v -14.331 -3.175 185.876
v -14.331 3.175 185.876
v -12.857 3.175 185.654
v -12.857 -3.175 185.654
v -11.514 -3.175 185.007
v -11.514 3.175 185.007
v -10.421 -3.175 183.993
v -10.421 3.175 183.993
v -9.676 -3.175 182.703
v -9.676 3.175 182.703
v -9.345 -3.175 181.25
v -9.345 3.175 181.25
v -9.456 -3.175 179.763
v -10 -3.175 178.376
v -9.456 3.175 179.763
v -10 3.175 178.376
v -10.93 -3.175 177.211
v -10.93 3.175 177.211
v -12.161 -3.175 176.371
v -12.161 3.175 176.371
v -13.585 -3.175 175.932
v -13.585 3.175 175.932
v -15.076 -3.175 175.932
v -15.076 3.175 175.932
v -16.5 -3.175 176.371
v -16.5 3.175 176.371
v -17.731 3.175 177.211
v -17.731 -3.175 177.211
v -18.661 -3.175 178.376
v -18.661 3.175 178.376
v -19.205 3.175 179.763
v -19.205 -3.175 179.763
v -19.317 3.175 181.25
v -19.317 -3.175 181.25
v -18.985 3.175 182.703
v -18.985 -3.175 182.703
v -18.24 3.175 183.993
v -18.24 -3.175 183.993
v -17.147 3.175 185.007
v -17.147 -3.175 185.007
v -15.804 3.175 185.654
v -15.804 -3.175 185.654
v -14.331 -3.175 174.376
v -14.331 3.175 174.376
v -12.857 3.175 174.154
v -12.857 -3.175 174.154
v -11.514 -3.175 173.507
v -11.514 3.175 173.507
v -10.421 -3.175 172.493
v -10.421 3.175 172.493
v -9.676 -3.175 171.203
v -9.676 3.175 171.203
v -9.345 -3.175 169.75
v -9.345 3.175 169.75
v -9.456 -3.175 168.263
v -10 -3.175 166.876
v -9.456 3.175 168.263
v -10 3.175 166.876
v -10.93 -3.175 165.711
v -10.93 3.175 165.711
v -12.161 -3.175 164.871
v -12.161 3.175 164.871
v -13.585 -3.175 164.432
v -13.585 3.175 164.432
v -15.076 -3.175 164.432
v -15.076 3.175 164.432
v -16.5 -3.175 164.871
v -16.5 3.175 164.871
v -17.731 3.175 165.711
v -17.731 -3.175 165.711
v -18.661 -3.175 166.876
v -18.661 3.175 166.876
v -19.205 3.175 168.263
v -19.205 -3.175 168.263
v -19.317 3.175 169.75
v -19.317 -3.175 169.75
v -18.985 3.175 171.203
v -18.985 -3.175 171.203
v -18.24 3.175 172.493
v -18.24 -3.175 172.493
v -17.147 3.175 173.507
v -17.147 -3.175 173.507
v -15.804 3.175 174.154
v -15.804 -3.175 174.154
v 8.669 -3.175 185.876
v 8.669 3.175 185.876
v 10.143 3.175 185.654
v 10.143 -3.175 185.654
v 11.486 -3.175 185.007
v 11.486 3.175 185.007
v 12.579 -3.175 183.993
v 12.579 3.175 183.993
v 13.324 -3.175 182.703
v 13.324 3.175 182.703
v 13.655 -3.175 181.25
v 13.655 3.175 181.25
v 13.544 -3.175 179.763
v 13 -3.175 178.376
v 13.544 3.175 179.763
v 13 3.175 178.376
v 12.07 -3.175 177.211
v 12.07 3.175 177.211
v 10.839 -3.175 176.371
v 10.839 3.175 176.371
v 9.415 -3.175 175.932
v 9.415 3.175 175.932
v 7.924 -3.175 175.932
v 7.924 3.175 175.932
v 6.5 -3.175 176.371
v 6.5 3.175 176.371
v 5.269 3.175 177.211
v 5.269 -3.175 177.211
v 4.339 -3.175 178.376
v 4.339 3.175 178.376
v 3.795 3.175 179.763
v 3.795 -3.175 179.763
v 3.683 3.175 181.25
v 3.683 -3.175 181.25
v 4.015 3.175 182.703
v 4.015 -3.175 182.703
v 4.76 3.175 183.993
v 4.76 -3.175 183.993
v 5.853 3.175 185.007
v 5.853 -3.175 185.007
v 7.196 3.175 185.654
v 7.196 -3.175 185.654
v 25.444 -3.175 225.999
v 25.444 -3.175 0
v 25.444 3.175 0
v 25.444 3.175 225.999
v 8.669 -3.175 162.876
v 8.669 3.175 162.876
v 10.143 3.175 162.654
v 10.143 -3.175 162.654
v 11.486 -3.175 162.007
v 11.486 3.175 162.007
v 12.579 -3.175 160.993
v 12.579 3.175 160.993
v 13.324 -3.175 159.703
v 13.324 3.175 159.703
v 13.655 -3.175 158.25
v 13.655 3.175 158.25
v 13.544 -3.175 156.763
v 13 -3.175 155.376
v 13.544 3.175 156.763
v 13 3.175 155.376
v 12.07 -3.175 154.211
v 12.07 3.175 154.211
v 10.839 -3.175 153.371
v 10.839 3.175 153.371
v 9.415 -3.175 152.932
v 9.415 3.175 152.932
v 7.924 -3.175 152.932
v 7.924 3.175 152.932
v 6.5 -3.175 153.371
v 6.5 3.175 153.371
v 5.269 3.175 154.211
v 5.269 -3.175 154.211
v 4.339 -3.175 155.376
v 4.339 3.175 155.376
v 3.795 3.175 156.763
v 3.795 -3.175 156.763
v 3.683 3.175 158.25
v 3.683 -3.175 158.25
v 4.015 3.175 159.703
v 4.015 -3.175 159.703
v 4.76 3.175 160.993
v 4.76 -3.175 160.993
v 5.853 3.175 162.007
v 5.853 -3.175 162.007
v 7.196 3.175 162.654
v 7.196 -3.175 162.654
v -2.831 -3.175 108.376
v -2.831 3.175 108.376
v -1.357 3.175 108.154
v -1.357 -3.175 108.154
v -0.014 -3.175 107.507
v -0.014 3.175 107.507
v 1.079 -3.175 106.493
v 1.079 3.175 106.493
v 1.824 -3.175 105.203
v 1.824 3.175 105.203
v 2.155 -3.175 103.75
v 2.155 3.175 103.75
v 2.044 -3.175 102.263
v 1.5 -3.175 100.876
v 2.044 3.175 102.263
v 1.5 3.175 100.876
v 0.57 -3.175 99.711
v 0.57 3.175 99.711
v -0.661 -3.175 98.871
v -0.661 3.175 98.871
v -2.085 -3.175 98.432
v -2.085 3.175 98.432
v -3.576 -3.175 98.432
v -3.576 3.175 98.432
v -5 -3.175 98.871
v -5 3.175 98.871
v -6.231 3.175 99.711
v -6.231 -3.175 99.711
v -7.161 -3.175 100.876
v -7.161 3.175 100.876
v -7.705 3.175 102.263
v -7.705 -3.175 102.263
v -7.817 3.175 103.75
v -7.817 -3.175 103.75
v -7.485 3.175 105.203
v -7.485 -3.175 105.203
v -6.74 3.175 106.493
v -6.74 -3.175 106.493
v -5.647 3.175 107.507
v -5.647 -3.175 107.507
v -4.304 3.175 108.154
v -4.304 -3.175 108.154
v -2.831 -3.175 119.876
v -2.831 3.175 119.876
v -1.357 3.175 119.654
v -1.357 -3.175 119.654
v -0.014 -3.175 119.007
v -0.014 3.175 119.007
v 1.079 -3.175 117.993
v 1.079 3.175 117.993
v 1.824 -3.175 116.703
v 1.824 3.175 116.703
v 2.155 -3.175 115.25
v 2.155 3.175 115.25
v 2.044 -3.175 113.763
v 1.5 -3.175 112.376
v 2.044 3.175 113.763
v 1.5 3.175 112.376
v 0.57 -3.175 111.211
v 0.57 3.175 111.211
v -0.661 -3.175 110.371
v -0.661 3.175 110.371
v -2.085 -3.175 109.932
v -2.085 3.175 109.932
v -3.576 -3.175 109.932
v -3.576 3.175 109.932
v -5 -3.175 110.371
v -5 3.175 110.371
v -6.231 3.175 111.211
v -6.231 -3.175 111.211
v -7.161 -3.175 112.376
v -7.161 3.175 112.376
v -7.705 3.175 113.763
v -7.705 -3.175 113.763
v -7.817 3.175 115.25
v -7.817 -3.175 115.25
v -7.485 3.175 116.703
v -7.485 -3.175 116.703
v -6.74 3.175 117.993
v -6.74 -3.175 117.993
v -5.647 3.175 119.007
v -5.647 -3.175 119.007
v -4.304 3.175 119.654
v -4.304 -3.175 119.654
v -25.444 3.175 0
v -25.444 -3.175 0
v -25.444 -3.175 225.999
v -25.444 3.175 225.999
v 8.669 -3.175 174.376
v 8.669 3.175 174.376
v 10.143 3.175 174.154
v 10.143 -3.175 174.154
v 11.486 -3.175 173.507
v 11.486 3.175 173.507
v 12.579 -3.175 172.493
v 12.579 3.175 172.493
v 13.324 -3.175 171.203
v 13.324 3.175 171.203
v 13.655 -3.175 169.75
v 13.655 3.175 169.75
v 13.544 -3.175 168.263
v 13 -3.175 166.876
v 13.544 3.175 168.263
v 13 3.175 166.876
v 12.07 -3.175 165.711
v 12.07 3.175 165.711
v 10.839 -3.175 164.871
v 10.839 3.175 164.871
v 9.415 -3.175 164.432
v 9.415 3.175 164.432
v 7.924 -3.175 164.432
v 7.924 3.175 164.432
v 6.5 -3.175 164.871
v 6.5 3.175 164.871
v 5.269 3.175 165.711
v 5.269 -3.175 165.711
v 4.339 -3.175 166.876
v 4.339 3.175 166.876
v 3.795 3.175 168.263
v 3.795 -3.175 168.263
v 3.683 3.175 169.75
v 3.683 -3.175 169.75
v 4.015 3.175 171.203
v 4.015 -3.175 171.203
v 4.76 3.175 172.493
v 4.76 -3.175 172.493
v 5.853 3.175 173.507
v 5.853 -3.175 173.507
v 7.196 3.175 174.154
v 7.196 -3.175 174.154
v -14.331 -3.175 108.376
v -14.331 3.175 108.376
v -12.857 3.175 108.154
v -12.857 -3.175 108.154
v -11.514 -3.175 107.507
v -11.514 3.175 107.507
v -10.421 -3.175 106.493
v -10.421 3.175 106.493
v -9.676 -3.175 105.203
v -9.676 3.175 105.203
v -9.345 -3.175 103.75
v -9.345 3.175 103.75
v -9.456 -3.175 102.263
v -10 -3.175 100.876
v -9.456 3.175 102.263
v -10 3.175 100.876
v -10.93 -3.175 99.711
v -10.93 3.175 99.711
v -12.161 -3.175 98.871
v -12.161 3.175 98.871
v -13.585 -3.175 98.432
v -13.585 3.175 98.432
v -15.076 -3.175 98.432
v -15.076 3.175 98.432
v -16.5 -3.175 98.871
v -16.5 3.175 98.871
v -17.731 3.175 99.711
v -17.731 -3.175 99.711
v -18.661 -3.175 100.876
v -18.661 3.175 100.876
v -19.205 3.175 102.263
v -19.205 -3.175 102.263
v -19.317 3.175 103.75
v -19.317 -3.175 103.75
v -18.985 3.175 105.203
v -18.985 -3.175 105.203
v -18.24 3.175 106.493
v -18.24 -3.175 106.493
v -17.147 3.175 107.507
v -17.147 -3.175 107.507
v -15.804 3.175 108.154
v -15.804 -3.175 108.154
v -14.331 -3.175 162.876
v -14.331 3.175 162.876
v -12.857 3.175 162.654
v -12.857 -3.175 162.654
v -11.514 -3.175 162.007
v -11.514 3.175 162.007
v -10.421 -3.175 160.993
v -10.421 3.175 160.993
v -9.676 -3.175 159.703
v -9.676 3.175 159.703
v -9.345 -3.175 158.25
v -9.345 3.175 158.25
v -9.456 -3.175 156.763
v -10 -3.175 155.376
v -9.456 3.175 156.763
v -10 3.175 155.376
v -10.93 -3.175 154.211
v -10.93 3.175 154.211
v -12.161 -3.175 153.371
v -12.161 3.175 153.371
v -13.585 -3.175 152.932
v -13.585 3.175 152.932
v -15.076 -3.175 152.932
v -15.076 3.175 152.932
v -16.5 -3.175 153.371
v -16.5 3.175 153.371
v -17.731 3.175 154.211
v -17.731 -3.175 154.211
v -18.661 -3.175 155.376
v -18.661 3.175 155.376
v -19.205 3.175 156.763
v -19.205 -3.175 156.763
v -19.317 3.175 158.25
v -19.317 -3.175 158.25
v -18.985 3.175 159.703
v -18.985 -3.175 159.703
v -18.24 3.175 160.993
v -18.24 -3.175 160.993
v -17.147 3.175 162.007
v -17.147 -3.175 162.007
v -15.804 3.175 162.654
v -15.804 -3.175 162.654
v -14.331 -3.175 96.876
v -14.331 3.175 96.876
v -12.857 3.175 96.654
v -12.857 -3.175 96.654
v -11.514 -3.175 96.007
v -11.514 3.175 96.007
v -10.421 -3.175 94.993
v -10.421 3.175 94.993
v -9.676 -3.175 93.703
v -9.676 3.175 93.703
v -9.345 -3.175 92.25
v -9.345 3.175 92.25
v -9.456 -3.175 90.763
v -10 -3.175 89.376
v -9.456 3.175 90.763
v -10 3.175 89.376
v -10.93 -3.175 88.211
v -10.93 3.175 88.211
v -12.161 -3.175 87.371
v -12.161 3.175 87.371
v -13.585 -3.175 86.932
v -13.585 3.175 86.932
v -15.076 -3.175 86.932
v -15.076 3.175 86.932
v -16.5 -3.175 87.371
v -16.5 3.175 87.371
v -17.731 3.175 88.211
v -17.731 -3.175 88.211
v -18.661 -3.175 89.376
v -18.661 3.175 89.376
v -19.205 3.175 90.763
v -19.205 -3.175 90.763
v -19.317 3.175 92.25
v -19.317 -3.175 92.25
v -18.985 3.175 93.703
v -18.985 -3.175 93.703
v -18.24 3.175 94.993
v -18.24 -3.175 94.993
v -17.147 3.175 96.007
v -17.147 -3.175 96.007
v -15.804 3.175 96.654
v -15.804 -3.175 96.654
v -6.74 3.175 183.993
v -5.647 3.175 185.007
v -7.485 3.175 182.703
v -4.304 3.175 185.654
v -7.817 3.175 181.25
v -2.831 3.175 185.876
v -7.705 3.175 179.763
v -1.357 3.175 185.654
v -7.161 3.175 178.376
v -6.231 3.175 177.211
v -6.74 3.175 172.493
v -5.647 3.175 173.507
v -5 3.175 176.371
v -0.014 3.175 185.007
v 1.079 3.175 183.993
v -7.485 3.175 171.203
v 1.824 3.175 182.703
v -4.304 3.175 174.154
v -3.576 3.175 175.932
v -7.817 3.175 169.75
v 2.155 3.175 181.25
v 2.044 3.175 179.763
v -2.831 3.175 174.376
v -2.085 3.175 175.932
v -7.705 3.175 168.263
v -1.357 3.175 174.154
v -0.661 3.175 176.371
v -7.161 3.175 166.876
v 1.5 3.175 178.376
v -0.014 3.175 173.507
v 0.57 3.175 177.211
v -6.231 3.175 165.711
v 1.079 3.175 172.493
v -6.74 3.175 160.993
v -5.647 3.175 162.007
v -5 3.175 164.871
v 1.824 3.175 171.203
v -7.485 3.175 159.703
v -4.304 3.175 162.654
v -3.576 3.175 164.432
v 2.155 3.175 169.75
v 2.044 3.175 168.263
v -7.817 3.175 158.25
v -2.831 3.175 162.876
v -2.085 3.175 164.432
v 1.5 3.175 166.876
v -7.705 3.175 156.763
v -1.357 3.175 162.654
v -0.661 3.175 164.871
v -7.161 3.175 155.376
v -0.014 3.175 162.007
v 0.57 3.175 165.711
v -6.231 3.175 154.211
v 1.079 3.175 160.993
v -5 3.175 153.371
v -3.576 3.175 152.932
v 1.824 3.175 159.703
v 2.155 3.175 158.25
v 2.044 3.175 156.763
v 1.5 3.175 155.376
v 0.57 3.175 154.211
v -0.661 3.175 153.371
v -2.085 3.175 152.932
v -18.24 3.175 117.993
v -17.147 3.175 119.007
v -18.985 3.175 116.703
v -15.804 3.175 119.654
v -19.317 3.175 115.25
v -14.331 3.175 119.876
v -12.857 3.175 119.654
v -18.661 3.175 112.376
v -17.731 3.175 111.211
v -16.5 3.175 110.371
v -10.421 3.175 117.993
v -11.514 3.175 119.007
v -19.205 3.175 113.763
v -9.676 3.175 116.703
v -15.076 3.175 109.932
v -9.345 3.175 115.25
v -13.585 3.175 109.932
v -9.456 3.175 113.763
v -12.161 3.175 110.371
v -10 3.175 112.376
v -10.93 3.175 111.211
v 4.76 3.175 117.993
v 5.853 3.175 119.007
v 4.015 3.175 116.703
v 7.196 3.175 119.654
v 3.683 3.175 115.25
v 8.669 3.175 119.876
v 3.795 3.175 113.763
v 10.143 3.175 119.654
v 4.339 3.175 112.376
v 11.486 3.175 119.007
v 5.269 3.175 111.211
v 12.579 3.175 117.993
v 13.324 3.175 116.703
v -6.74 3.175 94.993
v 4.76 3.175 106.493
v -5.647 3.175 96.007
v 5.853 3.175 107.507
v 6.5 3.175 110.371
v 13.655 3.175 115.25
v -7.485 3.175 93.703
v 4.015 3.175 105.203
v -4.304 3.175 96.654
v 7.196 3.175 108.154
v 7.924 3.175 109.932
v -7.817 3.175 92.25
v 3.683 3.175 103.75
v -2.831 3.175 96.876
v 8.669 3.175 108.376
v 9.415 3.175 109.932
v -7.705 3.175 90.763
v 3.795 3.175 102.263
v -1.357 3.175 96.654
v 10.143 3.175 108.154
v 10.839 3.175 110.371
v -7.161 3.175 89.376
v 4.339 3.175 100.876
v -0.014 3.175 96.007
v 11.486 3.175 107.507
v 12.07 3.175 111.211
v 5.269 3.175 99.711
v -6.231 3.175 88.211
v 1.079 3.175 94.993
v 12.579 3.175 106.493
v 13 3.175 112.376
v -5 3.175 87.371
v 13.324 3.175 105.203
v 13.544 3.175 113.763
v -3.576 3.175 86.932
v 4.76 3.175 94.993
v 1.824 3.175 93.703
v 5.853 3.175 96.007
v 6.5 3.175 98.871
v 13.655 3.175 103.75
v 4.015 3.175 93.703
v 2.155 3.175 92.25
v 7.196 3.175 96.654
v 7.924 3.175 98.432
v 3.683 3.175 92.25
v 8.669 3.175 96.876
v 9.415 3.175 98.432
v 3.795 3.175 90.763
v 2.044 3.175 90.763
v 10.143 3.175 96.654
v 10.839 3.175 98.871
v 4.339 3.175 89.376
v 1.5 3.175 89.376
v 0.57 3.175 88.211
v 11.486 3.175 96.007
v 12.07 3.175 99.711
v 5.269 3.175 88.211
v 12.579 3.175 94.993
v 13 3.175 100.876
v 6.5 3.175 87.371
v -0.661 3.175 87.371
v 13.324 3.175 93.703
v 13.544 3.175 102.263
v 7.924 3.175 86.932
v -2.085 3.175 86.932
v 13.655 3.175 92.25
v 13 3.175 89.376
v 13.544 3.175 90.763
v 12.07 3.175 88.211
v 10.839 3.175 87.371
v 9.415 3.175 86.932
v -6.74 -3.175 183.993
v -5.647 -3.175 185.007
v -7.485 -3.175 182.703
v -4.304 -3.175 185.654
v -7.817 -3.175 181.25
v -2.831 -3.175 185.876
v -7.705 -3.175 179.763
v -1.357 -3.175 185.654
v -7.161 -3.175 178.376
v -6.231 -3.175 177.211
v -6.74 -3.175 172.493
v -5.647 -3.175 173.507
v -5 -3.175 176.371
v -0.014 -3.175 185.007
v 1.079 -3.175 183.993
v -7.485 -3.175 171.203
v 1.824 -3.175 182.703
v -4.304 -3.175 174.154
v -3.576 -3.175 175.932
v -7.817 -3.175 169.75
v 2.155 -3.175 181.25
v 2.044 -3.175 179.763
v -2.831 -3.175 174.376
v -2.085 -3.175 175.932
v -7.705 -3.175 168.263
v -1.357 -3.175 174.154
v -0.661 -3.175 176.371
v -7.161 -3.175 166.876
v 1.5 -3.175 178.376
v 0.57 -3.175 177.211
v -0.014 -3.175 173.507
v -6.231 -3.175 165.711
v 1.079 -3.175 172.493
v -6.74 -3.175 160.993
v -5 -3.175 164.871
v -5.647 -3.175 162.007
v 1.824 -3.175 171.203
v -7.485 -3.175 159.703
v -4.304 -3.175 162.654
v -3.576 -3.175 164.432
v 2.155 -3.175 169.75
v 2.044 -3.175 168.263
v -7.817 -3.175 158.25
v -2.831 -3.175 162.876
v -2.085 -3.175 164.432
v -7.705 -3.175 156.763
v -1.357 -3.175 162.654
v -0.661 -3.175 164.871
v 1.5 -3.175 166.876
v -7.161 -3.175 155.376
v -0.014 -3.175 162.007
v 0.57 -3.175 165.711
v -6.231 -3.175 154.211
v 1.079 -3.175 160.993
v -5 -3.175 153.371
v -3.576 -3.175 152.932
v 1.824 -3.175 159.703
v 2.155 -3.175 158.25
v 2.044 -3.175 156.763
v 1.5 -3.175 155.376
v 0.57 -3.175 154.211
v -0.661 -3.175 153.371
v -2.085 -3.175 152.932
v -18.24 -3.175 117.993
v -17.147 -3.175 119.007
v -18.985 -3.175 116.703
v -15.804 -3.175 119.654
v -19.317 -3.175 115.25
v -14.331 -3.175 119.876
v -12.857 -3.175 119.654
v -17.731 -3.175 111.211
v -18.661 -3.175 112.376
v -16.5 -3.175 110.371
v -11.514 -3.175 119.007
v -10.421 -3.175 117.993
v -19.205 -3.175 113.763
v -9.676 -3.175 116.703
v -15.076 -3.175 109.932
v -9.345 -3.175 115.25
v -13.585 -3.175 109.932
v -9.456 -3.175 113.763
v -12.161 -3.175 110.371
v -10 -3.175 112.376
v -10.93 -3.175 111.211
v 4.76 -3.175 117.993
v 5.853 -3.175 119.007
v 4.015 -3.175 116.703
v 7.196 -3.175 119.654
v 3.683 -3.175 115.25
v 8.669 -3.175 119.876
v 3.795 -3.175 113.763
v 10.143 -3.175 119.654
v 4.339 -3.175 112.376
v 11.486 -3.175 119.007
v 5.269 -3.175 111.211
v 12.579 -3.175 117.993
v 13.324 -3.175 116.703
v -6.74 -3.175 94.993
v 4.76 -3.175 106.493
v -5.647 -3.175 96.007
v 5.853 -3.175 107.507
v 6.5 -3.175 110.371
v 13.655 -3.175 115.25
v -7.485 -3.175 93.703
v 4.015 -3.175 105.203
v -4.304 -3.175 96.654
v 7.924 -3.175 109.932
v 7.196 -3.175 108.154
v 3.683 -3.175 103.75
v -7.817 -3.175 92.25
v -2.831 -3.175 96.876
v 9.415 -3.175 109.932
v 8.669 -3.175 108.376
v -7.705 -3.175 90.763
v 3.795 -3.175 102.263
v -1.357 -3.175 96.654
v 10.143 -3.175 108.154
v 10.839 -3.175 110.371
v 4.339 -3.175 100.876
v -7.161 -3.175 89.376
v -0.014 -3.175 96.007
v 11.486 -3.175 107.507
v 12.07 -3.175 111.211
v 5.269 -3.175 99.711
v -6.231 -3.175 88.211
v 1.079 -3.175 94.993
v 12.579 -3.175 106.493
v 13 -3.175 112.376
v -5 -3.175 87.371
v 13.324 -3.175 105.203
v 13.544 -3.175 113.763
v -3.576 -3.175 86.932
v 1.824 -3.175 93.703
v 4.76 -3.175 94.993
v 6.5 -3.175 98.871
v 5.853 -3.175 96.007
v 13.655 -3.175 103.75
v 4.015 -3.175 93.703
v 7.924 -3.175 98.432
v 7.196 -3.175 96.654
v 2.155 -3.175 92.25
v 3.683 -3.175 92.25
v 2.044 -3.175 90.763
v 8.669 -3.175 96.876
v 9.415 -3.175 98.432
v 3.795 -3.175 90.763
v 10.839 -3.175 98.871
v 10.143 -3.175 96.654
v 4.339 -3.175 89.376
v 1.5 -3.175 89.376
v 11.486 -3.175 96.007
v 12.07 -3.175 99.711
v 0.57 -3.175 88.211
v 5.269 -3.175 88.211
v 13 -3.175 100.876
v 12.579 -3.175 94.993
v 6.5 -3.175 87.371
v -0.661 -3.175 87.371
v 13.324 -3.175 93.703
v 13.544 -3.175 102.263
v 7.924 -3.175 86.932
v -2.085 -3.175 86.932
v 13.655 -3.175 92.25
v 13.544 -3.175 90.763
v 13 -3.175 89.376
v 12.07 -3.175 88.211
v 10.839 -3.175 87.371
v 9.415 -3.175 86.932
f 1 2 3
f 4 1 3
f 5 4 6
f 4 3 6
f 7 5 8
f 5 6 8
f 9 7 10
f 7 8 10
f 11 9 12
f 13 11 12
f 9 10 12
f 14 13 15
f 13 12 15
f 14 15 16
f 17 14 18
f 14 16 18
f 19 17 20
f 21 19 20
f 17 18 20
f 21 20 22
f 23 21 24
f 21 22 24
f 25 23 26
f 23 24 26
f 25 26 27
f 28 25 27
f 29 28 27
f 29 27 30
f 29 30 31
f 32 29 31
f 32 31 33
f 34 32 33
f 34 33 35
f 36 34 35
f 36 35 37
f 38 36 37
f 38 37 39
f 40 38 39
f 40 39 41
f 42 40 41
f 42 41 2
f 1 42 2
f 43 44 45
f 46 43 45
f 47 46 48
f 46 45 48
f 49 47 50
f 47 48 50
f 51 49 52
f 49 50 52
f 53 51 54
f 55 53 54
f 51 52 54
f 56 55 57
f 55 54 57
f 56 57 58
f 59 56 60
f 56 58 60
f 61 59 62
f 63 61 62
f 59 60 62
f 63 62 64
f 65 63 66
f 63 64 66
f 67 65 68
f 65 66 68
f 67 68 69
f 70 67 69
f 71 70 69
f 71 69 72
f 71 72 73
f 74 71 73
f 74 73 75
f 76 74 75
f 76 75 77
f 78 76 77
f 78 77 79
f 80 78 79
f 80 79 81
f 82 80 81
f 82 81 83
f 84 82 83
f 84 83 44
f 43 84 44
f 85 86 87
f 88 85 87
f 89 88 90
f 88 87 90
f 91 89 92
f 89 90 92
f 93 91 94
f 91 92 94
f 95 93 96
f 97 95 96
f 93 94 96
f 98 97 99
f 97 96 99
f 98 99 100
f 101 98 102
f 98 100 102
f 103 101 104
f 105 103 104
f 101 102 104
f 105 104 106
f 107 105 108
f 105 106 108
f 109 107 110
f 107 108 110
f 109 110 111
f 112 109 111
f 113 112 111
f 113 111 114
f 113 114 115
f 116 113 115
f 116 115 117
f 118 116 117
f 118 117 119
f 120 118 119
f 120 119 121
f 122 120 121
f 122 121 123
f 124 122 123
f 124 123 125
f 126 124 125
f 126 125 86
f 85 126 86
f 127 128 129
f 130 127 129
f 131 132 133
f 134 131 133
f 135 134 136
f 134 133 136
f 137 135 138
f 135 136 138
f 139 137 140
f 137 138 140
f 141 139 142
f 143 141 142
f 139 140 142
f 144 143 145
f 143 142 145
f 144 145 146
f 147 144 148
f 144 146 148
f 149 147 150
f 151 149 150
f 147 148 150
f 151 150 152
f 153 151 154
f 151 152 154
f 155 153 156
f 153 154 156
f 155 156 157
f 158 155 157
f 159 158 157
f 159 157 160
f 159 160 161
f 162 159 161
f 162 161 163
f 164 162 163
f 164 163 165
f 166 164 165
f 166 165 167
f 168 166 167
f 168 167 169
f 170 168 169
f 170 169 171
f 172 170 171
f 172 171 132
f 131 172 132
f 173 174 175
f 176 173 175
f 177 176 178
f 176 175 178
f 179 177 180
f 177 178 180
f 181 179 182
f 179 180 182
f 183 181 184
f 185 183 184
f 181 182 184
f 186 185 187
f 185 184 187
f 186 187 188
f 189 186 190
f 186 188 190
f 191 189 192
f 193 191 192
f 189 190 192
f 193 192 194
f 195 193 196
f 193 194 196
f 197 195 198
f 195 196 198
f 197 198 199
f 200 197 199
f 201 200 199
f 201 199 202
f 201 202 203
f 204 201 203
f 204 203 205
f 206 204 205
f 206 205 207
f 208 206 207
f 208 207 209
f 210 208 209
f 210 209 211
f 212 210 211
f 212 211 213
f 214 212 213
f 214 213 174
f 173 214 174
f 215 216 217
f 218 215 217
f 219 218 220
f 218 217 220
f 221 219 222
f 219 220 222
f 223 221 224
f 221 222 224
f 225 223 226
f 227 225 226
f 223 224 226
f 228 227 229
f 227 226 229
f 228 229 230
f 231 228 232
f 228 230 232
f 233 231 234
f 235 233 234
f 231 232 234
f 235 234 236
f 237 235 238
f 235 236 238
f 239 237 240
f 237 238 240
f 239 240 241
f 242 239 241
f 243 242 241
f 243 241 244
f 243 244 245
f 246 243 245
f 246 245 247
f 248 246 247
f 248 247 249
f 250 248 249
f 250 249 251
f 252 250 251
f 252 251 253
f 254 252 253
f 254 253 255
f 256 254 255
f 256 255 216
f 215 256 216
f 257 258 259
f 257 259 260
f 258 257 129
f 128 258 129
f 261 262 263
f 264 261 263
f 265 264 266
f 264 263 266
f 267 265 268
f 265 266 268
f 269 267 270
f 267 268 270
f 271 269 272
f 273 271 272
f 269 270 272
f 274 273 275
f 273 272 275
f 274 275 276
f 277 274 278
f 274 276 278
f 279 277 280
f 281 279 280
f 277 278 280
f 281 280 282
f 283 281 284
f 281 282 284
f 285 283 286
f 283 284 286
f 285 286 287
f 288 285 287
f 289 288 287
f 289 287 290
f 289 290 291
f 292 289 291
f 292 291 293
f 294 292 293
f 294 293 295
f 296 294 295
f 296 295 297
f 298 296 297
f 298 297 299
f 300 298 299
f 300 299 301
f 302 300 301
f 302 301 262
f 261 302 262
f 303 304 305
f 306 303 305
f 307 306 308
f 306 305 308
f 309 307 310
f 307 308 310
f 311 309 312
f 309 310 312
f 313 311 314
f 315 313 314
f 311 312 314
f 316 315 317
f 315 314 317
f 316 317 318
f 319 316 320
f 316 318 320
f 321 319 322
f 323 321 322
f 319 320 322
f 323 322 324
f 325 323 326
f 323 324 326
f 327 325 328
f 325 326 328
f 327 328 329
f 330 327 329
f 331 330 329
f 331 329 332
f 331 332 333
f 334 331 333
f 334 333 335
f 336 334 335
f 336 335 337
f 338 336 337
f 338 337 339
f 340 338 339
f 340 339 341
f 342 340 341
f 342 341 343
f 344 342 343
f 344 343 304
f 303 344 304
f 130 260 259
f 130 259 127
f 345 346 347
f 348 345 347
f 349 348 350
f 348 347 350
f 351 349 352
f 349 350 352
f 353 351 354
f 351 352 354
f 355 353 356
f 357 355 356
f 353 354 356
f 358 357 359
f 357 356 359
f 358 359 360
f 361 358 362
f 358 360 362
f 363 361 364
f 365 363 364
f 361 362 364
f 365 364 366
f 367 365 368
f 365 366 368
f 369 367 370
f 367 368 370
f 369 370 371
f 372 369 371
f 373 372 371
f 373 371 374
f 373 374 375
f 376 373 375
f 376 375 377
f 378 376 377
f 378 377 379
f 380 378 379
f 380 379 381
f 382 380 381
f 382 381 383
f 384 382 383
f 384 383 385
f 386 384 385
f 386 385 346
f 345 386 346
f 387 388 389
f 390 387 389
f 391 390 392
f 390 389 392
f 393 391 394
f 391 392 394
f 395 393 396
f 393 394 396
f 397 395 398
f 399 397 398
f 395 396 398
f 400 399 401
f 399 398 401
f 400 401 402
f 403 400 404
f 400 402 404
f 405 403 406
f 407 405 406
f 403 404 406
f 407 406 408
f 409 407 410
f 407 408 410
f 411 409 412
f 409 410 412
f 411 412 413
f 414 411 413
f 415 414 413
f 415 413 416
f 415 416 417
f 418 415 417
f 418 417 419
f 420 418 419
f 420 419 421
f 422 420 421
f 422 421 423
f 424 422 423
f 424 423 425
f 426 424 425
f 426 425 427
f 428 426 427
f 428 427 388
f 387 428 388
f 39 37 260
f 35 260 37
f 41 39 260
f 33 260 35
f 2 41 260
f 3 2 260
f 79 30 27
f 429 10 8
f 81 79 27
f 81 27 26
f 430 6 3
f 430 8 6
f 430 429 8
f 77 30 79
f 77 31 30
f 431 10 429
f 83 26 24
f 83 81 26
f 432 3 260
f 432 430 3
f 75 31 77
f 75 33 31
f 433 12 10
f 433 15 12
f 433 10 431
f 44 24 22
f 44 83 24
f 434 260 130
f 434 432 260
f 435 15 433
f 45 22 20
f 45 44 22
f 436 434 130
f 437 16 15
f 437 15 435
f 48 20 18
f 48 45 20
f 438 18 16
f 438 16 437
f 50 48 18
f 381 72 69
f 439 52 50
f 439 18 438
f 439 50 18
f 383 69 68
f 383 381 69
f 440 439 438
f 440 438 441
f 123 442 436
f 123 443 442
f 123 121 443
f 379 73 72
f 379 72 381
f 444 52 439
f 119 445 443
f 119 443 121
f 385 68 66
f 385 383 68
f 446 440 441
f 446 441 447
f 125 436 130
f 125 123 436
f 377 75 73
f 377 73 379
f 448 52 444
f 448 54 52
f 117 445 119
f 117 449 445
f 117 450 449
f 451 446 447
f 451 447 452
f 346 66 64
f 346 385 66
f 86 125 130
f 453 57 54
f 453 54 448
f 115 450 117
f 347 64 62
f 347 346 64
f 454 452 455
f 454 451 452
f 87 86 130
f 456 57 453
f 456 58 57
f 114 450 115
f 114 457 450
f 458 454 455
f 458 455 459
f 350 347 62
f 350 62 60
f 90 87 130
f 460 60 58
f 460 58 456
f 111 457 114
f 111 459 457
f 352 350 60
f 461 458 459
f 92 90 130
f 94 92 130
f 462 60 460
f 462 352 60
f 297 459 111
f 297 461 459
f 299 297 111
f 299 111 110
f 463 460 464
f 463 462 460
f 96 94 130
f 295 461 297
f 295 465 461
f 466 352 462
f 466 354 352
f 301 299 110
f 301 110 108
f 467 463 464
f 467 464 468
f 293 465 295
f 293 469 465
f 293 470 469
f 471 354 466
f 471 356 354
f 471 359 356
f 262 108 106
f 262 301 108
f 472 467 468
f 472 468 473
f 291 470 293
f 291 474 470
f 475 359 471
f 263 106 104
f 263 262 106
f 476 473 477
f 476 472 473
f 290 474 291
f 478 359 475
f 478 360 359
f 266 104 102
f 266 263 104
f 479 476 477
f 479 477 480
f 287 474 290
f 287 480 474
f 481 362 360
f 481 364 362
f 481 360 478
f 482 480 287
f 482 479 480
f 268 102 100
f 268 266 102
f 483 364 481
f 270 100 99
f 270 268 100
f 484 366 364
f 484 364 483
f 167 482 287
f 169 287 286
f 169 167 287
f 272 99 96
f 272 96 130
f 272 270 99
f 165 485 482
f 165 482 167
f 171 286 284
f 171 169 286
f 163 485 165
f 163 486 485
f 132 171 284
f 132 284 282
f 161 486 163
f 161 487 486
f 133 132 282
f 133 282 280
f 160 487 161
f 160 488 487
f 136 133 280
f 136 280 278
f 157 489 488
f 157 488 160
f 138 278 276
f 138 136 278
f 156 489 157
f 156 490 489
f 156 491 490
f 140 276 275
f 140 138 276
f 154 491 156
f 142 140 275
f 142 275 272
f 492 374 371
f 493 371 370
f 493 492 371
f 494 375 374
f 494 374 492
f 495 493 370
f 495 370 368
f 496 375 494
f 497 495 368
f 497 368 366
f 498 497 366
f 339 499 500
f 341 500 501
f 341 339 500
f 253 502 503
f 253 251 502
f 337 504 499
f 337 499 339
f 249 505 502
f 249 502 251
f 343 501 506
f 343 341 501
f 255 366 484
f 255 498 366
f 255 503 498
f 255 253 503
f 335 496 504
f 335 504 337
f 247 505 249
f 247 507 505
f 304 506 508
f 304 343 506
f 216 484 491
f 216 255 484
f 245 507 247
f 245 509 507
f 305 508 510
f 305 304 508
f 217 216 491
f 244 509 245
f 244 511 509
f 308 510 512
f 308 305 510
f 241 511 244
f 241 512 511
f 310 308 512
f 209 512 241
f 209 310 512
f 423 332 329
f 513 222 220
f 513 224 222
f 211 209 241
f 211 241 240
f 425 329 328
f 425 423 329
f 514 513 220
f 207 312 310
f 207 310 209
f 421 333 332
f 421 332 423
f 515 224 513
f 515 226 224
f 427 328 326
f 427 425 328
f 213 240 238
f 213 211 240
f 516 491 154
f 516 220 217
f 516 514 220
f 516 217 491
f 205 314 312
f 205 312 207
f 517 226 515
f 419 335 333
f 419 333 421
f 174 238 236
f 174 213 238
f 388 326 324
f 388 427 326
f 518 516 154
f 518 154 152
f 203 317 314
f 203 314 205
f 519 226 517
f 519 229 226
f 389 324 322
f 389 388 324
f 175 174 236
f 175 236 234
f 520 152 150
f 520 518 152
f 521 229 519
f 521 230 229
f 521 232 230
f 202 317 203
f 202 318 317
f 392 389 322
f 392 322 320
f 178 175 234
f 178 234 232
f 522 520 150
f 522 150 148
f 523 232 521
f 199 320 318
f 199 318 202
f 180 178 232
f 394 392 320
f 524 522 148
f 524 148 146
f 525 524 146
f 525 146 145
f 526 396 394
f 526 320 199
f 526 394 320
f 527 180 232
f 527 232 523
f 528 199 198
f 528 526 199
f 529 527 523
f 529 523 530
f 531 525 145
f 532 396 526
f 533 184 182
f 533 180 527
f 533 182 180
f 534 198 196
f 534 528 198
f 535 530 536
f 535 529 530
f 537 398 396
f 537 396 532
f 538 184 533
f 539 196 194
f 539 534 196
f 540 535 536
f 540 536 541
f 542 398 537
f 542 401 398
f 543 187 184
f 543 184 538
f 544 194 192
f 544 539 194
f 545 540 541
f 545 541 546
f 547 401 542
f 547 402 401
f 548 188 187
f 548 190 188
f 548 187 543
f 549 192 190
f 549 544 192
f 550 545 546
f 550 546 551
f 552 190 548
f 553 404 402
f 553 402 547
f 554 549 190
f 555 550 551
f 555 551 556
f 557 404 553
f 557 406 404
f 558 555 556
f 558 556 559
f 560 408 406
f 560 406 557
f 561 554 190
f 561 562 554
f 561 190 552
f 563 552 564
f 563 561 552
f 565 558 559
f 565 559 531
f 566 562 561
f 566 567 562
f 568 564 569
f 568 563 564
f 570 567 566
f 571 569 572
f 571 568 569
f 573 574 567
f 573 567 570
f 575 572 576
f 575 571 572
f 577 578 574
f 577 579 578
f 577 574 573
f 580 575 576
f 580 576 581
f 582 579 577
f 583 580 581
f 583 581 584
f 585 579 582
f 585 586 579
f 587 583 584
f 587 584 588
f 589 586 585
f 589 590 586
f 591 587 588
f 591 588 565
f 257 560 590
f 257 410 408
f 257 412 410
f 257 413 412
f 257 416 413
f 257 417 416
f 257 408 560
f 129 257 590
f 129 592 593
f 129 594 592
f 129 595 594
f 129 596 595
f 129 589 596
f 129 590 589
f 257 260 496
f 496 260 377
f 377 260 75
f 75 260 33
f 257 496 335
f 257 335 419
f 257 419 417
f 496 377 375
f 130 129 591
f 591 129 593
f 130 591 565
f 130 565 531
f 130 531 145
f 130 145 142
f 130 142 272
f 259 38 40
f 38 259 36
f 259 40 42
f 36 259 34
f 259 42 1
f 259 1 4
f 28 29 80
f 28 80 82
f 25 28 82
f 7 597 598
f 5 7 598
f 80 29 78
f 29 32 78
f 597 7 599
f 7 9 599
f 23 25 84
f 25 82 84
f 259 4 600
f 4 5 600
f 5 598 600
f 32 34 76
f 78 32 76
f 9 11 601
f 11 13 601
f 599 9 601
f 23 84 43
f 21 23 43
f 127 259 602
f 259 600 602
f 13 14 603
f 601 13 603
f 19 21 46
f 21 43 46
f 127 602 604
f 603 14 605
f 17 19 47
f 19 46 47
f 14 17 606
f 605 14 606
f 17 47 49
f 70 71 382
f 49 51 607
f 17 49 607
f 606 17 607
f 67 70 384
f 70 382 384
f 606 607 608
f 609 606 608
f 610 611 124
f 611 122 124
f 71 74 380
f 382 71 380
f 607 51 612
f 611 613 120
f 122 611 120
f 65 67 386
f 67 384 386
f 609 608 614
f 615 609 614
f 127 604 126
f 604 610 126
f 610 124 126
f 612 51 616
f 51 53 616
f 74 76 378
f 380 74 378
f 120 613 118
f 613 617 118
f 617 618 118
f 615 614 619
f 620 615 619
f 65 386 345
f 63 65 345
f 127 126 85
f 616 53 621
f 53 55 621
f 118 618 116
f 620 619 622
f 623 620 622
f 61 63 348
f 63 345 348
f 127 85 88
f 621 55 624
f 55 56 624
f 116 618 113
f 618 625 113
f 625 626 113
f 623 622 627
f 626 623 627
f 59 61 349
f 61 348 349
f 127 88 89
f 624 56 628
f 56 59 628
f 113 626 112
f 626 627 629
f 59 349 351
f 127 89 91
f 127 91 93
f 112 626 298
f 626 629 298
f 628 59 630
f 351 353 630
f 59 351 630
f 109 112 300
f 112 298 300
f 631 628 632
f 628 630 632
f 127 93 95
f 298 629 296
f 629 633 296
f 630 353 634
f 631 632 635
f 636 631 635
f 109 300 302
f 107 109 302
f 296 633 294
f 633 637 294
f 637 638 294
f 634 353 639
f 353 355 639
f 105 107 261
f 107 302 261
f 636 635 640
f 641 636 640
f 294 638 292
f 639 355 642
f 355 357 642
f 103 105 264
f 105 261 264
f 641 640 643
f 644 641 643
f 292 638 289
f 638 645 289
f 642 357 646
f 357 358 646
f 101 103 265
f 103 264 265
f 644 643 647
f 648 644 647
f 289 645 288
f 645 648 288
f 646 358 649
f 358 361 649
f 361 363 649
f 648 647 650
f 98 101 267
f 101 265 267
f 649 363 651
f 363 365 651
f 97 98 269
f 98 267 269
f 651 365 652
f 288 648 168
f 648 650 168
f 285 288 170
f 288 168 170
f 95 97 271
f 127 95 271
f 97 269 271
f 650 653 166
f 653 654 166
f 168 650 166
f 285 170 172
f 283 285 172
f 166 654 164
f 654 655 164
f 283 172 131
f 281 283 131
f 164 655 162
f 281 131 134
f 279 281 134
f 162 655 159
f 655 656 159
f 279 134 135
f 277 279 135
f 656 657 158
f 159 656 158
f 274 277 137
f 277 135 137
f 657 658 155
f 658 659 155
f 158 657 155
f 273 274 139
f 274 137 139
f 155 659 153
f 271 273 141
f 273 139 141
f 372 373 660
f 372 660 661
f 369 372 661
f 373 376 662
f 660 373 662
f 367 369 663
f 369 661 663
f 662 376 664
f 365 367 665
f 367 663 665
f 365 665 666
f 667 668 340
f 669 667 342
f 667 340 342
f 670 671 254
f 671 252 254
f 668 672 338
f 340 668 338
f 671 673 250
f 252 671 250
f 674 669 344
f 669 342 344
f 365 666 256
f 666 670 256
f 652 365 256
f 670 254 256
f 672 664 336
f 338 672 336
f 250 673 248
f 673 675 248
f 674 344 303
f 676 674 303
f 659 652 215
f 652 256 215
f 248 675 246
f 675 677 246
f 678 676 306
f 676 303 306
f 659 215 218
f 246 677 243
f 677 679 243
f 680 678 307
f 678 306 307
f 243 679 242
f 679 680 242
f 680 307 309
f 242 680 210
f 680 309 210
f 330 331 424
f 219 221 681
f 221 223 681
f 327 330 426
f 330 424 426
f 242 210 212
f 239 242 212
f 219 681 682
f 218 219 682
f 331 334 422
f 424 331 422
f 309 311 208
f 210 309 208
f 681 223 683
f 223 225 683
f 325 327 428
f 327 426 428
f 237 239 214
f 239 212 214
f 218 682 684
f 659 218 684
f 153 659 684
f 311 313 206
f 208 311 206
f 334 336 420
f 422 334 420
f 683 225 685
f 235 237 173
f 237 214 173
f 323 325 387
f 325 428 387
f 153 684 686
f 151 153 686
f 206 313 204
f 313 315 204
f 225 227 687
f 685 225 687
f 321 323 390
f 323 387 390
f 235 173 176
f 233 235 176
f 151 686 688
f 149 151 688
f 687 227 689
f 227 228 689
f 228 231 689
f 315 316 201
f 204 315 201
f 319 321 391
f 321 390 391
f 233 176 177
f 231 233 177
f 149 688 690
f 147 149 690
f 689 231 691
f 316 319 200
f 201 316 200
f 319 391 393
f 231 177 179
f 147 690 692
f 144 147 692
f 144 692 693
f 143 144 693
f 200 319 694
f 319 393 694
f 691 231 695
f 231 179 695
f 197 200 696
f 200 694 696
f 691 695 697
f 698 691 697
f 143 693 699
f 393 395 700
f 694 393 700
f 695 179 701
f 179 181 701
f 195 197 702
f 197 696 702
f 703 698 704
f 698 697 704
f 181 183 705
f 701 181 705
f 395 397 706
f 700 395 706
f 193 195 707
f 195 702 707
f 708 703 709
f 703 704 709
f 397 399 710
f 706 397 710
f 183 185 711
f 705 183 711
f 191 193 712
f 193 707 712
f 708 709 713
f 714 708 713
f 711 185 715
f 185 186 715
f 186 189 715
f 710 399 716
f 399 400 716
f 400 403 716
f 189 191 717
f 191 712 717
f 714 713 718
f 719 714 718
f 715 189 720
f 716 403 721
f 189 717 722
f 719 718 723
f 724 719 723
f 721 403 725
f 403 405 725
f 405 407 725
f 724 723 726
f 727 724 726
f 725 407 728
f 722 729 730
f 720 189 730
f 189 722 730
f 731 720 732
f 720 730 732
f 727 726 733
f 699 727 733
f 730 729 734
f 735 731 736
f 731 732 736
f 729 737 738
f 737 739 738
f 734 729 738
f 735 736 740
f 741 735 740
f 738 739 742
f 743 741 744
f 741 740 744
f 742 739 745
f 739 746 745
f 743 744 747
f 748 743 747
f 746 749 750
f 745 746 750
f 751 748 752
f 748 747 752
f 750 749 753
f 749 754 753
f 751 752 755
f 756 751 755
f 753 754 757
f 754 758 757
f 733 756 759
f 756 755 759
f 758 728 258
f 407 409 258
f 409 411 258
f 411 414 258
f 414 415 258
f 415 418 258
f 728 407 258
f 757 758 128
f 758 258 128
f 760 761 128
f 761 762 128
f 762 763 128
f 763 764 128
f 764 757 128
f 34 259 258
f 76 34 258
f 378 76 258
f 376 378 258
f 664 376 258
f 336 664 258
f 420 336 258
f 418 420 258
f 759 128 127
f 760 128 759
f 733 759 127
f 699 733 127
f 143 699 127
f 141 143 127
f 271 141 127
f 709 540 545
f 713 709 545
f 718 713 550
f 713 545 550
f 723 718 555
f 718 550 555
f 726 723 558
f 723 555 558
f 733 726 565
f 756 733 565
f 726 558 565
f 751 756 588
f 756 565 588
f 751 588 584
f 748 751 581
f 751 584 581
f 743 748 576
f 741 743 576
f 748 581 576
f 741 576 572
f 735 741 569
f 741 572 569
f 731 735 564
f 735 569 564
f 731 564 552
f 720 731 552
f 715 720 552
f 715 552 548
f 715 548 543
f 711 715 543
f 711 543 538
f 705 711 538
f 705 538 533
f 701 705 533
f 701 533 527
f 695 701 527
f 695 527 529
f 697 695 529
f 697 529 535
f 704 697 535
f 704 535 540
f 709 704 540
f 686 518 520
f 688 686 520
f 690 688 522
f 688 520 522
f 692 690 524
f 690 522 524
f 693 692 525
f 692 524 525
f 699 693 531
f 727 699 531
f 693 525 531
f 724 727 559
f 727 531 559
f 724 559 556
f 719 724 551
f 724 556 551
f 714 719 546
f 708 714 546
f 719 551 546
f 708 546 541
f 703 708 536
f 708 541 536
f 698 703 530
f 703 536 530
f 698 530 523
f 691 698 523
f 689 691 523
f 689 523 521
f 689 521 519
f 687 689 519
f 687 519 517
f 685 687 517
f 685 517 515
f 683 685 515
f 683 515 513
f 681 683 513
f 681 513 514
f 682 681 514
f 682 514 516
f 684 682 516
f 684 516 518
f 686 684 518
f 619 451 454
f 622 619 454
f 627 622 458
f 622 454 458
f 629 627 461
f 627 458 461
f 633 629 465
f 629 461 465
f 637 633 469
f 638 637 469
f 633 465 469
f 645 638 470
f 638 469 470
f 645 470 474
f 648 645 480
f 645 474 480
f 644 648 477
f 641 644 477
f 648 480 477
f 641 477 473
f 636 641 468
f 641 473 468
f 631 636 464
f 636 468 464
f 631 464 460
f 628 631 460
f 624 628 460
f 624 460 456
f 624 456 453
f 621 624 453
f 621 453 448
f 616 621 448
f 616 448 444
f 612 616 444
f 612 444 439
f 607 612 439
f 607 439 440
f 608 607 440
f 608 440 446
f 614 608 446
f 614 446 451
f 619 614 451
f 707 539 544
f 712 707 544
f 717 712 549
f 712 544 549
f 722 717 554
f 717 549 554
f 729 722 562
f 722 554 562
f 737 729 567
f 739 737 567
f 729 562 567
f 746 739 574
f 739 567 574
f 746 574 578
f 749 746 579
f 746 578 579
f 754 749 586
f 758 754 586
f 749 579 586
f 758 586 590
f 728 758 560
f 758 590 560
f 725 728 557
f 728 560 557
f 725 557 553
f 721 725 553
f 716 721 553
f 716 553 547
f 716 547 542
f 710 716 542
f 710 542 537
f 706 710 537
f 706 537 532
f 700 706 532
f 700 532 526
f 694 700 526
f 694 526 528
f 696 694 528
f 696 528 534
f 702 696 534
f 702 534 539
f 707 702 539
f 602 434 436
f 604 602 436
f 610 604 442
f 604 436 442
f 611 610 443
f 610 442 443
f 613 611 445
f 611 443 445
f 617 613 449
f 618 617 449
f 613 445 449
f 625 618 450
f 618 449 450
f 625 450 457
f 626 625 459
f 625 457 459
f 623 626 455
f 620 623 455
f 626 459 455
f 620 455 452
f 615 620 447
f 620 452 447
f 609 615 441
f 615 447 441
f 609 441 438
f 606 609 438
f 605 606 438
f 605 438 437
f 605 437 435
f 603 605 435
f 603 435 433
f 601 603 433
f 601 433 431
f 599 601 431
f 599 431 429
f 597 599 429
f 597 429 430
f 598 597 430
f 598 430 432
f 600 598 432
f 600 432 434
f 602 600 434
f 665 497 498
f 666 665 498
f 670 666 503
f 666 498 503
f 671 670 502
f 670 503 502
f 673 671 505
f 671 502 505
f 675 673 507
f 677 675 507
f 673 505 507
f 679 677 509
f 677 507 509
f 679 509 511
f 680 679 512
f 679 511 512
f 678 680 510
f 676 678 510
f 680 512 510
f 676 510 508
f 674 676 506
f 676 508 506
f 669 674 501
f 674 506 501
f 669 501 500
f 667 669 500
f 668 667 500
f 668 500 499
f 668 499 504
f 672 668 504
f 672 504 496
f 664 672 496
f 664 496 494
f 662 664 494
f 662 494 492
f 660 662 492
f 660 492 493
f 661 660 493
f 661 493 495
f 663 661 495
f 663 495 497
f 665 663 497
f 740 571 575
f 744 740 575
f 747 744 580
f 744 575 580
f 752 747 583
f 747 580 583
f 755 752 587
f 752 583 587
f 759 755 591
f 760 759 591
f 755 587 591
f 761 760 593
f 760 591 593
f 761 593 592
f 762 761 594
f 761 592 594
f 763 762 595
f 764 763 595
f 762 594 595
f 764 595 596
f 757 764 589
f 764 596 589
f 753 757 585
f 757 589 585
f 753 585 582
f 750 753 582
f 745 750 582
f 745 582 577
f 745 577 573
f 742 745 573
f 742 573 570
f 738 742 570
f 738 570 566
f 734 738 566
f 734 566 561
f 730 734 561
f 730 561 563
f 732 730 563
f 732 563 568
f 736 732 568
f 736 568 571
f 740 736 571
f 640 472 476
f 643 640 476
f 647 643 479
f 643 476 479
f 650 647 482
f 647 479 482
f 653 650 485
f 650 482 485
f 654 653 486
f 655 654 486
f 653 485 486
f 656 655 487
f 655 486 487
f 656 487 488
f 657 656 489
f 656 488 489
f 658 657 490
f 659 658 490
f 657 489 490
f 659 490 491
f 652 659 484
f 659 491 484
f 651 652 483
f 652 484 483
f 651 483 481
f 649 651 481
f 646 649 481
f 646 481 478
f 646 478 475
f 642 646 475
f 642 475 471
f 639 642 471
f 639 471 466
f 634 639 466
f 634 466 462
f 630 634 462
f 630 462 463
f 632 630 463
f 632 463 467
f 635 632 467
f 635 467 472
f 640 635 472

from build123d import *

# Parameters (mm, degrees)
SKETCH1_W                 = 50.8889
SKETCH1_H                 = 6.35
BOSS_EXTRUDE1_DEPTH       = 225.99904
SKETCH3_R                 = 5.000000033
CUT_EXTRUDE1_DEPTH        = 228.515512914
LPATTERN1_COUNT           = 3
LPATTERN1_PITCH           = 11.500000114
LPATTERN1_COUNT_DIR2      = 3
LPATTERN1_PITCH_DIR2      = 11.500000114
LPATTERN2_COUNT           = 2
LPATTERN2_PITCH           = 66.00000008
LPATTERN2_COPY_1_SKETCH_R = 5.000000033
LPATTERN2_COPY_1_DEPTH    = 228.515512914
LPATTERN2_COPY_2_SKETCH_R = 5.000000033
LPATTERN2_COPY_2_DEPTH    = 228.515512914
LPATTERN2_COPY_3_SKETCH_R = 5.000000033
LPATTERN2_COPY_3_DEPTH    = 228.515512914
LPATTERN2_COPY_4_SKETCH_R = 5.000000033
LPATTERN2_COPY_4_DEPTH    = 228.515512914
LPATTERN2_COPY_5_SKETCH_R = 5.000000033
LPATTERN2_COPY_5_DEPTH    = 228.515512914
LPATTERN2_COPY_6_SKETCH_R = 5.000000033
LPATTERN2_COPY_6_DEPTH    = 228.515512914
LPATTERN2_COPY_7_SKETCH_R = 5.000000033
LPATTERN2_COPY_7_DEPTH    = 228.515512914
LPATTERN2_COPY_8_SKETCH_R = 5.000000033
LPATTERN2_COPY_8_DEPTH    = 228.515512914


with BuildPart() as part:
    # Sketch1 → Boss-Extrude1 (new body)
    with BuildSketch(Plane.XY):
        Rectangle(SKETCH1_W, SKETCH1_H)
    extrude(amount=BOSS_EXTRUDE1_DEPTH)

    # Sketch3 → Cut-Extrude1 (cut, through all)
    with BuildSketch(Plane(origin=(0, 3.175, 0), x_dir=(1, 0, 0), z_dir=(0, 1, 0))):
        with Locations(Location((8.669450022, -180.875882939, 0), (0, 0, 270))):
            Circle(SKETCH3_R)
    cut_extrude1 = extrude(amount=-CUT_EXTRUDE1_DEPTH, mode=Mode.SUBTRACT)

    # LPattern1: Cut-Extrude1 3 × 3
    with Locations(*[(-i * LPATTERN1_PITCH, 0, -j * LPATTERN1_PITCH_DIR2) for i in range(LPATTERN1_COUNT) for j in range(LPATTERN1_COUNT_DIR2) if (i, j) != (0, 0)]):
        add(cut_extrude1, mode=Mode.SUBTRACT)

    # LPattern2: Cut-Extrude1 ×2
    with Locations(*[(0, 0, -i * LPATTERN2_PITCH) for i in range(1, LPATTERN2_COUNT)]):
        add(cut_extrude1, mode=Mode.SUBTRACT)

    # LPattern2 copy 1 sketch → LPattern2 copy 1 (cut, through all)
    with BuildSketch(Plane(origin=(0, 3.175, -77.500000194), x_dir=(1, 0, 0), z_dir=(0, 1, 0))):
        with Locations(Location((8.669450022, -180.875882939, 0), (0, 0, 270))):
            Circle(LPATTERN2_COPY_1_SKETCH_R)
    extrude(amount=-LPATTERN2_COPY_1_DEPTH, mode=Mode.SUBTRACT)

    # LPattern2 copy 2 sketch → LPattern2 copy 2 (cut, through all)
    with BuildSketch(Plane(origin=(0, 3.175, -89.000000308), x_dir=(1, 0, 0), z_dir=(0, 1, 0))):
        with Locations(Location((8.669450022, -180.875882939, 0), (0, 0, 270))):
            Circle(LPATTERN2_COPY_2_SKETCH_R)
    extrude(amount=-LPATTERN2_COPY_2_DEPTH, mode=Mode.SUBTRACT)

    # LPattern2 copy 3 sketch → LPattern2 copy 3 (cut, through all)
    with BuildSketch(Plane(origin=(-11.500000114, 3.175, -66.00000008), x_dir=(1, 0, 0), z_dir=(0, 1, 0))):
        with Locations(Location((8.669450022, -180.875882939, 0), (0, 0, 270))):
            Circle(LPATTERN2_COPY_3_SKETCH_R)
    extrude(amount=-LPATTERN2_COPY_3_DEPTH, mode=Mode.SUBTRACT)

    # LPattern2 copy 4 sketch → LPattern2 copy 4 (cut, through all)
    with BuildSketch(Plane(origin=(-11.500000114, 3.175, -77.500000194), x_dir=(1, 0, 0), z_dir=(0, 1, 0))):
        with Locations(Location((8.669450022, -180.875882939, 0), (0, 0, 270))):
            Circle(LPATTERN2_COPY_4_SKETCH_R)
    extrude(amount=-LPATTERN2_COPY_4_DEPTH, mode=Mode.SUBTRACT)

    # LPattern2 copy 5 sketch → LPattern2 copy 5 (cut, through all)
    with BuildSketch(Plane(origin=(-11.500000114, 3.175, -89.000000308), x_dir=(1, 0, 0), z_dir=(0, 1, 0))):
        with Locations(Location((8.669450022, -180.875882939, 0), (0, 0, 270))):
            Circle(LPATTERN2_COPY_5_SKETCH_R)
    extrude(amount=-LPATTERN2_COPY_5_DEPTH, mode=Mode.SUBTRACT)

    # LPattern2 copy 6 sketch → LPattern2 copy 6 (cut, through all)
    with BuildSketch(Plane(origin=(-23.000000228, 3.175, -66.00000008), x_dir=(1, 0, 0), z_dir=(0, 1, 0))):
        with Locations(Location((8.669450022, -180.875882939, 0), (0, 0, 270))):
            Circle(LPATTERN2_COPY_6_SKETCH_R)
    extrude(amount=-LPATTERN2_COPY_6_DEPTH, mode=Mode.SUBTRACT)

    # LPattern2 copy 7 sketch → LPattern2 copy 7 (cut, through all)
    with BuildSketch(Plane(origin=(-23.000000228, 3.175, -77.500000194), x_dir=(1, 0, 0), z_dir=(0, 1, 0))):
        with Locations(Location((8.669450022, -180.875882939, 0), (0, 0, 270))):
            Circle(LPATTERN2_COPY_7_SKETCH_R)
    extrude(amount=-LPATTERN2_COPY_7_DEPTH, mode=Mode.SUBTRACT)

    # LPattern2 copy 8 sketch → LPattern2 copy 8 (cut, through all)
    with BuildSketch(Plane(origin=(-23.000000228, 3.175, -89.000000308), x_dir=(1, 0, 0), z_dir=(0, 1, 0))):
        with Locations(Location((8.669450022, -180.875882939, 0), (0, 0, 270))):
            Circle(LPATTERN2_COPY_8_SKETCH_R)
    extrude(amount=-LPATTERN2_COPY_8_DEPTH, mode=Mode.SUBTRACT)


solid = part.part
